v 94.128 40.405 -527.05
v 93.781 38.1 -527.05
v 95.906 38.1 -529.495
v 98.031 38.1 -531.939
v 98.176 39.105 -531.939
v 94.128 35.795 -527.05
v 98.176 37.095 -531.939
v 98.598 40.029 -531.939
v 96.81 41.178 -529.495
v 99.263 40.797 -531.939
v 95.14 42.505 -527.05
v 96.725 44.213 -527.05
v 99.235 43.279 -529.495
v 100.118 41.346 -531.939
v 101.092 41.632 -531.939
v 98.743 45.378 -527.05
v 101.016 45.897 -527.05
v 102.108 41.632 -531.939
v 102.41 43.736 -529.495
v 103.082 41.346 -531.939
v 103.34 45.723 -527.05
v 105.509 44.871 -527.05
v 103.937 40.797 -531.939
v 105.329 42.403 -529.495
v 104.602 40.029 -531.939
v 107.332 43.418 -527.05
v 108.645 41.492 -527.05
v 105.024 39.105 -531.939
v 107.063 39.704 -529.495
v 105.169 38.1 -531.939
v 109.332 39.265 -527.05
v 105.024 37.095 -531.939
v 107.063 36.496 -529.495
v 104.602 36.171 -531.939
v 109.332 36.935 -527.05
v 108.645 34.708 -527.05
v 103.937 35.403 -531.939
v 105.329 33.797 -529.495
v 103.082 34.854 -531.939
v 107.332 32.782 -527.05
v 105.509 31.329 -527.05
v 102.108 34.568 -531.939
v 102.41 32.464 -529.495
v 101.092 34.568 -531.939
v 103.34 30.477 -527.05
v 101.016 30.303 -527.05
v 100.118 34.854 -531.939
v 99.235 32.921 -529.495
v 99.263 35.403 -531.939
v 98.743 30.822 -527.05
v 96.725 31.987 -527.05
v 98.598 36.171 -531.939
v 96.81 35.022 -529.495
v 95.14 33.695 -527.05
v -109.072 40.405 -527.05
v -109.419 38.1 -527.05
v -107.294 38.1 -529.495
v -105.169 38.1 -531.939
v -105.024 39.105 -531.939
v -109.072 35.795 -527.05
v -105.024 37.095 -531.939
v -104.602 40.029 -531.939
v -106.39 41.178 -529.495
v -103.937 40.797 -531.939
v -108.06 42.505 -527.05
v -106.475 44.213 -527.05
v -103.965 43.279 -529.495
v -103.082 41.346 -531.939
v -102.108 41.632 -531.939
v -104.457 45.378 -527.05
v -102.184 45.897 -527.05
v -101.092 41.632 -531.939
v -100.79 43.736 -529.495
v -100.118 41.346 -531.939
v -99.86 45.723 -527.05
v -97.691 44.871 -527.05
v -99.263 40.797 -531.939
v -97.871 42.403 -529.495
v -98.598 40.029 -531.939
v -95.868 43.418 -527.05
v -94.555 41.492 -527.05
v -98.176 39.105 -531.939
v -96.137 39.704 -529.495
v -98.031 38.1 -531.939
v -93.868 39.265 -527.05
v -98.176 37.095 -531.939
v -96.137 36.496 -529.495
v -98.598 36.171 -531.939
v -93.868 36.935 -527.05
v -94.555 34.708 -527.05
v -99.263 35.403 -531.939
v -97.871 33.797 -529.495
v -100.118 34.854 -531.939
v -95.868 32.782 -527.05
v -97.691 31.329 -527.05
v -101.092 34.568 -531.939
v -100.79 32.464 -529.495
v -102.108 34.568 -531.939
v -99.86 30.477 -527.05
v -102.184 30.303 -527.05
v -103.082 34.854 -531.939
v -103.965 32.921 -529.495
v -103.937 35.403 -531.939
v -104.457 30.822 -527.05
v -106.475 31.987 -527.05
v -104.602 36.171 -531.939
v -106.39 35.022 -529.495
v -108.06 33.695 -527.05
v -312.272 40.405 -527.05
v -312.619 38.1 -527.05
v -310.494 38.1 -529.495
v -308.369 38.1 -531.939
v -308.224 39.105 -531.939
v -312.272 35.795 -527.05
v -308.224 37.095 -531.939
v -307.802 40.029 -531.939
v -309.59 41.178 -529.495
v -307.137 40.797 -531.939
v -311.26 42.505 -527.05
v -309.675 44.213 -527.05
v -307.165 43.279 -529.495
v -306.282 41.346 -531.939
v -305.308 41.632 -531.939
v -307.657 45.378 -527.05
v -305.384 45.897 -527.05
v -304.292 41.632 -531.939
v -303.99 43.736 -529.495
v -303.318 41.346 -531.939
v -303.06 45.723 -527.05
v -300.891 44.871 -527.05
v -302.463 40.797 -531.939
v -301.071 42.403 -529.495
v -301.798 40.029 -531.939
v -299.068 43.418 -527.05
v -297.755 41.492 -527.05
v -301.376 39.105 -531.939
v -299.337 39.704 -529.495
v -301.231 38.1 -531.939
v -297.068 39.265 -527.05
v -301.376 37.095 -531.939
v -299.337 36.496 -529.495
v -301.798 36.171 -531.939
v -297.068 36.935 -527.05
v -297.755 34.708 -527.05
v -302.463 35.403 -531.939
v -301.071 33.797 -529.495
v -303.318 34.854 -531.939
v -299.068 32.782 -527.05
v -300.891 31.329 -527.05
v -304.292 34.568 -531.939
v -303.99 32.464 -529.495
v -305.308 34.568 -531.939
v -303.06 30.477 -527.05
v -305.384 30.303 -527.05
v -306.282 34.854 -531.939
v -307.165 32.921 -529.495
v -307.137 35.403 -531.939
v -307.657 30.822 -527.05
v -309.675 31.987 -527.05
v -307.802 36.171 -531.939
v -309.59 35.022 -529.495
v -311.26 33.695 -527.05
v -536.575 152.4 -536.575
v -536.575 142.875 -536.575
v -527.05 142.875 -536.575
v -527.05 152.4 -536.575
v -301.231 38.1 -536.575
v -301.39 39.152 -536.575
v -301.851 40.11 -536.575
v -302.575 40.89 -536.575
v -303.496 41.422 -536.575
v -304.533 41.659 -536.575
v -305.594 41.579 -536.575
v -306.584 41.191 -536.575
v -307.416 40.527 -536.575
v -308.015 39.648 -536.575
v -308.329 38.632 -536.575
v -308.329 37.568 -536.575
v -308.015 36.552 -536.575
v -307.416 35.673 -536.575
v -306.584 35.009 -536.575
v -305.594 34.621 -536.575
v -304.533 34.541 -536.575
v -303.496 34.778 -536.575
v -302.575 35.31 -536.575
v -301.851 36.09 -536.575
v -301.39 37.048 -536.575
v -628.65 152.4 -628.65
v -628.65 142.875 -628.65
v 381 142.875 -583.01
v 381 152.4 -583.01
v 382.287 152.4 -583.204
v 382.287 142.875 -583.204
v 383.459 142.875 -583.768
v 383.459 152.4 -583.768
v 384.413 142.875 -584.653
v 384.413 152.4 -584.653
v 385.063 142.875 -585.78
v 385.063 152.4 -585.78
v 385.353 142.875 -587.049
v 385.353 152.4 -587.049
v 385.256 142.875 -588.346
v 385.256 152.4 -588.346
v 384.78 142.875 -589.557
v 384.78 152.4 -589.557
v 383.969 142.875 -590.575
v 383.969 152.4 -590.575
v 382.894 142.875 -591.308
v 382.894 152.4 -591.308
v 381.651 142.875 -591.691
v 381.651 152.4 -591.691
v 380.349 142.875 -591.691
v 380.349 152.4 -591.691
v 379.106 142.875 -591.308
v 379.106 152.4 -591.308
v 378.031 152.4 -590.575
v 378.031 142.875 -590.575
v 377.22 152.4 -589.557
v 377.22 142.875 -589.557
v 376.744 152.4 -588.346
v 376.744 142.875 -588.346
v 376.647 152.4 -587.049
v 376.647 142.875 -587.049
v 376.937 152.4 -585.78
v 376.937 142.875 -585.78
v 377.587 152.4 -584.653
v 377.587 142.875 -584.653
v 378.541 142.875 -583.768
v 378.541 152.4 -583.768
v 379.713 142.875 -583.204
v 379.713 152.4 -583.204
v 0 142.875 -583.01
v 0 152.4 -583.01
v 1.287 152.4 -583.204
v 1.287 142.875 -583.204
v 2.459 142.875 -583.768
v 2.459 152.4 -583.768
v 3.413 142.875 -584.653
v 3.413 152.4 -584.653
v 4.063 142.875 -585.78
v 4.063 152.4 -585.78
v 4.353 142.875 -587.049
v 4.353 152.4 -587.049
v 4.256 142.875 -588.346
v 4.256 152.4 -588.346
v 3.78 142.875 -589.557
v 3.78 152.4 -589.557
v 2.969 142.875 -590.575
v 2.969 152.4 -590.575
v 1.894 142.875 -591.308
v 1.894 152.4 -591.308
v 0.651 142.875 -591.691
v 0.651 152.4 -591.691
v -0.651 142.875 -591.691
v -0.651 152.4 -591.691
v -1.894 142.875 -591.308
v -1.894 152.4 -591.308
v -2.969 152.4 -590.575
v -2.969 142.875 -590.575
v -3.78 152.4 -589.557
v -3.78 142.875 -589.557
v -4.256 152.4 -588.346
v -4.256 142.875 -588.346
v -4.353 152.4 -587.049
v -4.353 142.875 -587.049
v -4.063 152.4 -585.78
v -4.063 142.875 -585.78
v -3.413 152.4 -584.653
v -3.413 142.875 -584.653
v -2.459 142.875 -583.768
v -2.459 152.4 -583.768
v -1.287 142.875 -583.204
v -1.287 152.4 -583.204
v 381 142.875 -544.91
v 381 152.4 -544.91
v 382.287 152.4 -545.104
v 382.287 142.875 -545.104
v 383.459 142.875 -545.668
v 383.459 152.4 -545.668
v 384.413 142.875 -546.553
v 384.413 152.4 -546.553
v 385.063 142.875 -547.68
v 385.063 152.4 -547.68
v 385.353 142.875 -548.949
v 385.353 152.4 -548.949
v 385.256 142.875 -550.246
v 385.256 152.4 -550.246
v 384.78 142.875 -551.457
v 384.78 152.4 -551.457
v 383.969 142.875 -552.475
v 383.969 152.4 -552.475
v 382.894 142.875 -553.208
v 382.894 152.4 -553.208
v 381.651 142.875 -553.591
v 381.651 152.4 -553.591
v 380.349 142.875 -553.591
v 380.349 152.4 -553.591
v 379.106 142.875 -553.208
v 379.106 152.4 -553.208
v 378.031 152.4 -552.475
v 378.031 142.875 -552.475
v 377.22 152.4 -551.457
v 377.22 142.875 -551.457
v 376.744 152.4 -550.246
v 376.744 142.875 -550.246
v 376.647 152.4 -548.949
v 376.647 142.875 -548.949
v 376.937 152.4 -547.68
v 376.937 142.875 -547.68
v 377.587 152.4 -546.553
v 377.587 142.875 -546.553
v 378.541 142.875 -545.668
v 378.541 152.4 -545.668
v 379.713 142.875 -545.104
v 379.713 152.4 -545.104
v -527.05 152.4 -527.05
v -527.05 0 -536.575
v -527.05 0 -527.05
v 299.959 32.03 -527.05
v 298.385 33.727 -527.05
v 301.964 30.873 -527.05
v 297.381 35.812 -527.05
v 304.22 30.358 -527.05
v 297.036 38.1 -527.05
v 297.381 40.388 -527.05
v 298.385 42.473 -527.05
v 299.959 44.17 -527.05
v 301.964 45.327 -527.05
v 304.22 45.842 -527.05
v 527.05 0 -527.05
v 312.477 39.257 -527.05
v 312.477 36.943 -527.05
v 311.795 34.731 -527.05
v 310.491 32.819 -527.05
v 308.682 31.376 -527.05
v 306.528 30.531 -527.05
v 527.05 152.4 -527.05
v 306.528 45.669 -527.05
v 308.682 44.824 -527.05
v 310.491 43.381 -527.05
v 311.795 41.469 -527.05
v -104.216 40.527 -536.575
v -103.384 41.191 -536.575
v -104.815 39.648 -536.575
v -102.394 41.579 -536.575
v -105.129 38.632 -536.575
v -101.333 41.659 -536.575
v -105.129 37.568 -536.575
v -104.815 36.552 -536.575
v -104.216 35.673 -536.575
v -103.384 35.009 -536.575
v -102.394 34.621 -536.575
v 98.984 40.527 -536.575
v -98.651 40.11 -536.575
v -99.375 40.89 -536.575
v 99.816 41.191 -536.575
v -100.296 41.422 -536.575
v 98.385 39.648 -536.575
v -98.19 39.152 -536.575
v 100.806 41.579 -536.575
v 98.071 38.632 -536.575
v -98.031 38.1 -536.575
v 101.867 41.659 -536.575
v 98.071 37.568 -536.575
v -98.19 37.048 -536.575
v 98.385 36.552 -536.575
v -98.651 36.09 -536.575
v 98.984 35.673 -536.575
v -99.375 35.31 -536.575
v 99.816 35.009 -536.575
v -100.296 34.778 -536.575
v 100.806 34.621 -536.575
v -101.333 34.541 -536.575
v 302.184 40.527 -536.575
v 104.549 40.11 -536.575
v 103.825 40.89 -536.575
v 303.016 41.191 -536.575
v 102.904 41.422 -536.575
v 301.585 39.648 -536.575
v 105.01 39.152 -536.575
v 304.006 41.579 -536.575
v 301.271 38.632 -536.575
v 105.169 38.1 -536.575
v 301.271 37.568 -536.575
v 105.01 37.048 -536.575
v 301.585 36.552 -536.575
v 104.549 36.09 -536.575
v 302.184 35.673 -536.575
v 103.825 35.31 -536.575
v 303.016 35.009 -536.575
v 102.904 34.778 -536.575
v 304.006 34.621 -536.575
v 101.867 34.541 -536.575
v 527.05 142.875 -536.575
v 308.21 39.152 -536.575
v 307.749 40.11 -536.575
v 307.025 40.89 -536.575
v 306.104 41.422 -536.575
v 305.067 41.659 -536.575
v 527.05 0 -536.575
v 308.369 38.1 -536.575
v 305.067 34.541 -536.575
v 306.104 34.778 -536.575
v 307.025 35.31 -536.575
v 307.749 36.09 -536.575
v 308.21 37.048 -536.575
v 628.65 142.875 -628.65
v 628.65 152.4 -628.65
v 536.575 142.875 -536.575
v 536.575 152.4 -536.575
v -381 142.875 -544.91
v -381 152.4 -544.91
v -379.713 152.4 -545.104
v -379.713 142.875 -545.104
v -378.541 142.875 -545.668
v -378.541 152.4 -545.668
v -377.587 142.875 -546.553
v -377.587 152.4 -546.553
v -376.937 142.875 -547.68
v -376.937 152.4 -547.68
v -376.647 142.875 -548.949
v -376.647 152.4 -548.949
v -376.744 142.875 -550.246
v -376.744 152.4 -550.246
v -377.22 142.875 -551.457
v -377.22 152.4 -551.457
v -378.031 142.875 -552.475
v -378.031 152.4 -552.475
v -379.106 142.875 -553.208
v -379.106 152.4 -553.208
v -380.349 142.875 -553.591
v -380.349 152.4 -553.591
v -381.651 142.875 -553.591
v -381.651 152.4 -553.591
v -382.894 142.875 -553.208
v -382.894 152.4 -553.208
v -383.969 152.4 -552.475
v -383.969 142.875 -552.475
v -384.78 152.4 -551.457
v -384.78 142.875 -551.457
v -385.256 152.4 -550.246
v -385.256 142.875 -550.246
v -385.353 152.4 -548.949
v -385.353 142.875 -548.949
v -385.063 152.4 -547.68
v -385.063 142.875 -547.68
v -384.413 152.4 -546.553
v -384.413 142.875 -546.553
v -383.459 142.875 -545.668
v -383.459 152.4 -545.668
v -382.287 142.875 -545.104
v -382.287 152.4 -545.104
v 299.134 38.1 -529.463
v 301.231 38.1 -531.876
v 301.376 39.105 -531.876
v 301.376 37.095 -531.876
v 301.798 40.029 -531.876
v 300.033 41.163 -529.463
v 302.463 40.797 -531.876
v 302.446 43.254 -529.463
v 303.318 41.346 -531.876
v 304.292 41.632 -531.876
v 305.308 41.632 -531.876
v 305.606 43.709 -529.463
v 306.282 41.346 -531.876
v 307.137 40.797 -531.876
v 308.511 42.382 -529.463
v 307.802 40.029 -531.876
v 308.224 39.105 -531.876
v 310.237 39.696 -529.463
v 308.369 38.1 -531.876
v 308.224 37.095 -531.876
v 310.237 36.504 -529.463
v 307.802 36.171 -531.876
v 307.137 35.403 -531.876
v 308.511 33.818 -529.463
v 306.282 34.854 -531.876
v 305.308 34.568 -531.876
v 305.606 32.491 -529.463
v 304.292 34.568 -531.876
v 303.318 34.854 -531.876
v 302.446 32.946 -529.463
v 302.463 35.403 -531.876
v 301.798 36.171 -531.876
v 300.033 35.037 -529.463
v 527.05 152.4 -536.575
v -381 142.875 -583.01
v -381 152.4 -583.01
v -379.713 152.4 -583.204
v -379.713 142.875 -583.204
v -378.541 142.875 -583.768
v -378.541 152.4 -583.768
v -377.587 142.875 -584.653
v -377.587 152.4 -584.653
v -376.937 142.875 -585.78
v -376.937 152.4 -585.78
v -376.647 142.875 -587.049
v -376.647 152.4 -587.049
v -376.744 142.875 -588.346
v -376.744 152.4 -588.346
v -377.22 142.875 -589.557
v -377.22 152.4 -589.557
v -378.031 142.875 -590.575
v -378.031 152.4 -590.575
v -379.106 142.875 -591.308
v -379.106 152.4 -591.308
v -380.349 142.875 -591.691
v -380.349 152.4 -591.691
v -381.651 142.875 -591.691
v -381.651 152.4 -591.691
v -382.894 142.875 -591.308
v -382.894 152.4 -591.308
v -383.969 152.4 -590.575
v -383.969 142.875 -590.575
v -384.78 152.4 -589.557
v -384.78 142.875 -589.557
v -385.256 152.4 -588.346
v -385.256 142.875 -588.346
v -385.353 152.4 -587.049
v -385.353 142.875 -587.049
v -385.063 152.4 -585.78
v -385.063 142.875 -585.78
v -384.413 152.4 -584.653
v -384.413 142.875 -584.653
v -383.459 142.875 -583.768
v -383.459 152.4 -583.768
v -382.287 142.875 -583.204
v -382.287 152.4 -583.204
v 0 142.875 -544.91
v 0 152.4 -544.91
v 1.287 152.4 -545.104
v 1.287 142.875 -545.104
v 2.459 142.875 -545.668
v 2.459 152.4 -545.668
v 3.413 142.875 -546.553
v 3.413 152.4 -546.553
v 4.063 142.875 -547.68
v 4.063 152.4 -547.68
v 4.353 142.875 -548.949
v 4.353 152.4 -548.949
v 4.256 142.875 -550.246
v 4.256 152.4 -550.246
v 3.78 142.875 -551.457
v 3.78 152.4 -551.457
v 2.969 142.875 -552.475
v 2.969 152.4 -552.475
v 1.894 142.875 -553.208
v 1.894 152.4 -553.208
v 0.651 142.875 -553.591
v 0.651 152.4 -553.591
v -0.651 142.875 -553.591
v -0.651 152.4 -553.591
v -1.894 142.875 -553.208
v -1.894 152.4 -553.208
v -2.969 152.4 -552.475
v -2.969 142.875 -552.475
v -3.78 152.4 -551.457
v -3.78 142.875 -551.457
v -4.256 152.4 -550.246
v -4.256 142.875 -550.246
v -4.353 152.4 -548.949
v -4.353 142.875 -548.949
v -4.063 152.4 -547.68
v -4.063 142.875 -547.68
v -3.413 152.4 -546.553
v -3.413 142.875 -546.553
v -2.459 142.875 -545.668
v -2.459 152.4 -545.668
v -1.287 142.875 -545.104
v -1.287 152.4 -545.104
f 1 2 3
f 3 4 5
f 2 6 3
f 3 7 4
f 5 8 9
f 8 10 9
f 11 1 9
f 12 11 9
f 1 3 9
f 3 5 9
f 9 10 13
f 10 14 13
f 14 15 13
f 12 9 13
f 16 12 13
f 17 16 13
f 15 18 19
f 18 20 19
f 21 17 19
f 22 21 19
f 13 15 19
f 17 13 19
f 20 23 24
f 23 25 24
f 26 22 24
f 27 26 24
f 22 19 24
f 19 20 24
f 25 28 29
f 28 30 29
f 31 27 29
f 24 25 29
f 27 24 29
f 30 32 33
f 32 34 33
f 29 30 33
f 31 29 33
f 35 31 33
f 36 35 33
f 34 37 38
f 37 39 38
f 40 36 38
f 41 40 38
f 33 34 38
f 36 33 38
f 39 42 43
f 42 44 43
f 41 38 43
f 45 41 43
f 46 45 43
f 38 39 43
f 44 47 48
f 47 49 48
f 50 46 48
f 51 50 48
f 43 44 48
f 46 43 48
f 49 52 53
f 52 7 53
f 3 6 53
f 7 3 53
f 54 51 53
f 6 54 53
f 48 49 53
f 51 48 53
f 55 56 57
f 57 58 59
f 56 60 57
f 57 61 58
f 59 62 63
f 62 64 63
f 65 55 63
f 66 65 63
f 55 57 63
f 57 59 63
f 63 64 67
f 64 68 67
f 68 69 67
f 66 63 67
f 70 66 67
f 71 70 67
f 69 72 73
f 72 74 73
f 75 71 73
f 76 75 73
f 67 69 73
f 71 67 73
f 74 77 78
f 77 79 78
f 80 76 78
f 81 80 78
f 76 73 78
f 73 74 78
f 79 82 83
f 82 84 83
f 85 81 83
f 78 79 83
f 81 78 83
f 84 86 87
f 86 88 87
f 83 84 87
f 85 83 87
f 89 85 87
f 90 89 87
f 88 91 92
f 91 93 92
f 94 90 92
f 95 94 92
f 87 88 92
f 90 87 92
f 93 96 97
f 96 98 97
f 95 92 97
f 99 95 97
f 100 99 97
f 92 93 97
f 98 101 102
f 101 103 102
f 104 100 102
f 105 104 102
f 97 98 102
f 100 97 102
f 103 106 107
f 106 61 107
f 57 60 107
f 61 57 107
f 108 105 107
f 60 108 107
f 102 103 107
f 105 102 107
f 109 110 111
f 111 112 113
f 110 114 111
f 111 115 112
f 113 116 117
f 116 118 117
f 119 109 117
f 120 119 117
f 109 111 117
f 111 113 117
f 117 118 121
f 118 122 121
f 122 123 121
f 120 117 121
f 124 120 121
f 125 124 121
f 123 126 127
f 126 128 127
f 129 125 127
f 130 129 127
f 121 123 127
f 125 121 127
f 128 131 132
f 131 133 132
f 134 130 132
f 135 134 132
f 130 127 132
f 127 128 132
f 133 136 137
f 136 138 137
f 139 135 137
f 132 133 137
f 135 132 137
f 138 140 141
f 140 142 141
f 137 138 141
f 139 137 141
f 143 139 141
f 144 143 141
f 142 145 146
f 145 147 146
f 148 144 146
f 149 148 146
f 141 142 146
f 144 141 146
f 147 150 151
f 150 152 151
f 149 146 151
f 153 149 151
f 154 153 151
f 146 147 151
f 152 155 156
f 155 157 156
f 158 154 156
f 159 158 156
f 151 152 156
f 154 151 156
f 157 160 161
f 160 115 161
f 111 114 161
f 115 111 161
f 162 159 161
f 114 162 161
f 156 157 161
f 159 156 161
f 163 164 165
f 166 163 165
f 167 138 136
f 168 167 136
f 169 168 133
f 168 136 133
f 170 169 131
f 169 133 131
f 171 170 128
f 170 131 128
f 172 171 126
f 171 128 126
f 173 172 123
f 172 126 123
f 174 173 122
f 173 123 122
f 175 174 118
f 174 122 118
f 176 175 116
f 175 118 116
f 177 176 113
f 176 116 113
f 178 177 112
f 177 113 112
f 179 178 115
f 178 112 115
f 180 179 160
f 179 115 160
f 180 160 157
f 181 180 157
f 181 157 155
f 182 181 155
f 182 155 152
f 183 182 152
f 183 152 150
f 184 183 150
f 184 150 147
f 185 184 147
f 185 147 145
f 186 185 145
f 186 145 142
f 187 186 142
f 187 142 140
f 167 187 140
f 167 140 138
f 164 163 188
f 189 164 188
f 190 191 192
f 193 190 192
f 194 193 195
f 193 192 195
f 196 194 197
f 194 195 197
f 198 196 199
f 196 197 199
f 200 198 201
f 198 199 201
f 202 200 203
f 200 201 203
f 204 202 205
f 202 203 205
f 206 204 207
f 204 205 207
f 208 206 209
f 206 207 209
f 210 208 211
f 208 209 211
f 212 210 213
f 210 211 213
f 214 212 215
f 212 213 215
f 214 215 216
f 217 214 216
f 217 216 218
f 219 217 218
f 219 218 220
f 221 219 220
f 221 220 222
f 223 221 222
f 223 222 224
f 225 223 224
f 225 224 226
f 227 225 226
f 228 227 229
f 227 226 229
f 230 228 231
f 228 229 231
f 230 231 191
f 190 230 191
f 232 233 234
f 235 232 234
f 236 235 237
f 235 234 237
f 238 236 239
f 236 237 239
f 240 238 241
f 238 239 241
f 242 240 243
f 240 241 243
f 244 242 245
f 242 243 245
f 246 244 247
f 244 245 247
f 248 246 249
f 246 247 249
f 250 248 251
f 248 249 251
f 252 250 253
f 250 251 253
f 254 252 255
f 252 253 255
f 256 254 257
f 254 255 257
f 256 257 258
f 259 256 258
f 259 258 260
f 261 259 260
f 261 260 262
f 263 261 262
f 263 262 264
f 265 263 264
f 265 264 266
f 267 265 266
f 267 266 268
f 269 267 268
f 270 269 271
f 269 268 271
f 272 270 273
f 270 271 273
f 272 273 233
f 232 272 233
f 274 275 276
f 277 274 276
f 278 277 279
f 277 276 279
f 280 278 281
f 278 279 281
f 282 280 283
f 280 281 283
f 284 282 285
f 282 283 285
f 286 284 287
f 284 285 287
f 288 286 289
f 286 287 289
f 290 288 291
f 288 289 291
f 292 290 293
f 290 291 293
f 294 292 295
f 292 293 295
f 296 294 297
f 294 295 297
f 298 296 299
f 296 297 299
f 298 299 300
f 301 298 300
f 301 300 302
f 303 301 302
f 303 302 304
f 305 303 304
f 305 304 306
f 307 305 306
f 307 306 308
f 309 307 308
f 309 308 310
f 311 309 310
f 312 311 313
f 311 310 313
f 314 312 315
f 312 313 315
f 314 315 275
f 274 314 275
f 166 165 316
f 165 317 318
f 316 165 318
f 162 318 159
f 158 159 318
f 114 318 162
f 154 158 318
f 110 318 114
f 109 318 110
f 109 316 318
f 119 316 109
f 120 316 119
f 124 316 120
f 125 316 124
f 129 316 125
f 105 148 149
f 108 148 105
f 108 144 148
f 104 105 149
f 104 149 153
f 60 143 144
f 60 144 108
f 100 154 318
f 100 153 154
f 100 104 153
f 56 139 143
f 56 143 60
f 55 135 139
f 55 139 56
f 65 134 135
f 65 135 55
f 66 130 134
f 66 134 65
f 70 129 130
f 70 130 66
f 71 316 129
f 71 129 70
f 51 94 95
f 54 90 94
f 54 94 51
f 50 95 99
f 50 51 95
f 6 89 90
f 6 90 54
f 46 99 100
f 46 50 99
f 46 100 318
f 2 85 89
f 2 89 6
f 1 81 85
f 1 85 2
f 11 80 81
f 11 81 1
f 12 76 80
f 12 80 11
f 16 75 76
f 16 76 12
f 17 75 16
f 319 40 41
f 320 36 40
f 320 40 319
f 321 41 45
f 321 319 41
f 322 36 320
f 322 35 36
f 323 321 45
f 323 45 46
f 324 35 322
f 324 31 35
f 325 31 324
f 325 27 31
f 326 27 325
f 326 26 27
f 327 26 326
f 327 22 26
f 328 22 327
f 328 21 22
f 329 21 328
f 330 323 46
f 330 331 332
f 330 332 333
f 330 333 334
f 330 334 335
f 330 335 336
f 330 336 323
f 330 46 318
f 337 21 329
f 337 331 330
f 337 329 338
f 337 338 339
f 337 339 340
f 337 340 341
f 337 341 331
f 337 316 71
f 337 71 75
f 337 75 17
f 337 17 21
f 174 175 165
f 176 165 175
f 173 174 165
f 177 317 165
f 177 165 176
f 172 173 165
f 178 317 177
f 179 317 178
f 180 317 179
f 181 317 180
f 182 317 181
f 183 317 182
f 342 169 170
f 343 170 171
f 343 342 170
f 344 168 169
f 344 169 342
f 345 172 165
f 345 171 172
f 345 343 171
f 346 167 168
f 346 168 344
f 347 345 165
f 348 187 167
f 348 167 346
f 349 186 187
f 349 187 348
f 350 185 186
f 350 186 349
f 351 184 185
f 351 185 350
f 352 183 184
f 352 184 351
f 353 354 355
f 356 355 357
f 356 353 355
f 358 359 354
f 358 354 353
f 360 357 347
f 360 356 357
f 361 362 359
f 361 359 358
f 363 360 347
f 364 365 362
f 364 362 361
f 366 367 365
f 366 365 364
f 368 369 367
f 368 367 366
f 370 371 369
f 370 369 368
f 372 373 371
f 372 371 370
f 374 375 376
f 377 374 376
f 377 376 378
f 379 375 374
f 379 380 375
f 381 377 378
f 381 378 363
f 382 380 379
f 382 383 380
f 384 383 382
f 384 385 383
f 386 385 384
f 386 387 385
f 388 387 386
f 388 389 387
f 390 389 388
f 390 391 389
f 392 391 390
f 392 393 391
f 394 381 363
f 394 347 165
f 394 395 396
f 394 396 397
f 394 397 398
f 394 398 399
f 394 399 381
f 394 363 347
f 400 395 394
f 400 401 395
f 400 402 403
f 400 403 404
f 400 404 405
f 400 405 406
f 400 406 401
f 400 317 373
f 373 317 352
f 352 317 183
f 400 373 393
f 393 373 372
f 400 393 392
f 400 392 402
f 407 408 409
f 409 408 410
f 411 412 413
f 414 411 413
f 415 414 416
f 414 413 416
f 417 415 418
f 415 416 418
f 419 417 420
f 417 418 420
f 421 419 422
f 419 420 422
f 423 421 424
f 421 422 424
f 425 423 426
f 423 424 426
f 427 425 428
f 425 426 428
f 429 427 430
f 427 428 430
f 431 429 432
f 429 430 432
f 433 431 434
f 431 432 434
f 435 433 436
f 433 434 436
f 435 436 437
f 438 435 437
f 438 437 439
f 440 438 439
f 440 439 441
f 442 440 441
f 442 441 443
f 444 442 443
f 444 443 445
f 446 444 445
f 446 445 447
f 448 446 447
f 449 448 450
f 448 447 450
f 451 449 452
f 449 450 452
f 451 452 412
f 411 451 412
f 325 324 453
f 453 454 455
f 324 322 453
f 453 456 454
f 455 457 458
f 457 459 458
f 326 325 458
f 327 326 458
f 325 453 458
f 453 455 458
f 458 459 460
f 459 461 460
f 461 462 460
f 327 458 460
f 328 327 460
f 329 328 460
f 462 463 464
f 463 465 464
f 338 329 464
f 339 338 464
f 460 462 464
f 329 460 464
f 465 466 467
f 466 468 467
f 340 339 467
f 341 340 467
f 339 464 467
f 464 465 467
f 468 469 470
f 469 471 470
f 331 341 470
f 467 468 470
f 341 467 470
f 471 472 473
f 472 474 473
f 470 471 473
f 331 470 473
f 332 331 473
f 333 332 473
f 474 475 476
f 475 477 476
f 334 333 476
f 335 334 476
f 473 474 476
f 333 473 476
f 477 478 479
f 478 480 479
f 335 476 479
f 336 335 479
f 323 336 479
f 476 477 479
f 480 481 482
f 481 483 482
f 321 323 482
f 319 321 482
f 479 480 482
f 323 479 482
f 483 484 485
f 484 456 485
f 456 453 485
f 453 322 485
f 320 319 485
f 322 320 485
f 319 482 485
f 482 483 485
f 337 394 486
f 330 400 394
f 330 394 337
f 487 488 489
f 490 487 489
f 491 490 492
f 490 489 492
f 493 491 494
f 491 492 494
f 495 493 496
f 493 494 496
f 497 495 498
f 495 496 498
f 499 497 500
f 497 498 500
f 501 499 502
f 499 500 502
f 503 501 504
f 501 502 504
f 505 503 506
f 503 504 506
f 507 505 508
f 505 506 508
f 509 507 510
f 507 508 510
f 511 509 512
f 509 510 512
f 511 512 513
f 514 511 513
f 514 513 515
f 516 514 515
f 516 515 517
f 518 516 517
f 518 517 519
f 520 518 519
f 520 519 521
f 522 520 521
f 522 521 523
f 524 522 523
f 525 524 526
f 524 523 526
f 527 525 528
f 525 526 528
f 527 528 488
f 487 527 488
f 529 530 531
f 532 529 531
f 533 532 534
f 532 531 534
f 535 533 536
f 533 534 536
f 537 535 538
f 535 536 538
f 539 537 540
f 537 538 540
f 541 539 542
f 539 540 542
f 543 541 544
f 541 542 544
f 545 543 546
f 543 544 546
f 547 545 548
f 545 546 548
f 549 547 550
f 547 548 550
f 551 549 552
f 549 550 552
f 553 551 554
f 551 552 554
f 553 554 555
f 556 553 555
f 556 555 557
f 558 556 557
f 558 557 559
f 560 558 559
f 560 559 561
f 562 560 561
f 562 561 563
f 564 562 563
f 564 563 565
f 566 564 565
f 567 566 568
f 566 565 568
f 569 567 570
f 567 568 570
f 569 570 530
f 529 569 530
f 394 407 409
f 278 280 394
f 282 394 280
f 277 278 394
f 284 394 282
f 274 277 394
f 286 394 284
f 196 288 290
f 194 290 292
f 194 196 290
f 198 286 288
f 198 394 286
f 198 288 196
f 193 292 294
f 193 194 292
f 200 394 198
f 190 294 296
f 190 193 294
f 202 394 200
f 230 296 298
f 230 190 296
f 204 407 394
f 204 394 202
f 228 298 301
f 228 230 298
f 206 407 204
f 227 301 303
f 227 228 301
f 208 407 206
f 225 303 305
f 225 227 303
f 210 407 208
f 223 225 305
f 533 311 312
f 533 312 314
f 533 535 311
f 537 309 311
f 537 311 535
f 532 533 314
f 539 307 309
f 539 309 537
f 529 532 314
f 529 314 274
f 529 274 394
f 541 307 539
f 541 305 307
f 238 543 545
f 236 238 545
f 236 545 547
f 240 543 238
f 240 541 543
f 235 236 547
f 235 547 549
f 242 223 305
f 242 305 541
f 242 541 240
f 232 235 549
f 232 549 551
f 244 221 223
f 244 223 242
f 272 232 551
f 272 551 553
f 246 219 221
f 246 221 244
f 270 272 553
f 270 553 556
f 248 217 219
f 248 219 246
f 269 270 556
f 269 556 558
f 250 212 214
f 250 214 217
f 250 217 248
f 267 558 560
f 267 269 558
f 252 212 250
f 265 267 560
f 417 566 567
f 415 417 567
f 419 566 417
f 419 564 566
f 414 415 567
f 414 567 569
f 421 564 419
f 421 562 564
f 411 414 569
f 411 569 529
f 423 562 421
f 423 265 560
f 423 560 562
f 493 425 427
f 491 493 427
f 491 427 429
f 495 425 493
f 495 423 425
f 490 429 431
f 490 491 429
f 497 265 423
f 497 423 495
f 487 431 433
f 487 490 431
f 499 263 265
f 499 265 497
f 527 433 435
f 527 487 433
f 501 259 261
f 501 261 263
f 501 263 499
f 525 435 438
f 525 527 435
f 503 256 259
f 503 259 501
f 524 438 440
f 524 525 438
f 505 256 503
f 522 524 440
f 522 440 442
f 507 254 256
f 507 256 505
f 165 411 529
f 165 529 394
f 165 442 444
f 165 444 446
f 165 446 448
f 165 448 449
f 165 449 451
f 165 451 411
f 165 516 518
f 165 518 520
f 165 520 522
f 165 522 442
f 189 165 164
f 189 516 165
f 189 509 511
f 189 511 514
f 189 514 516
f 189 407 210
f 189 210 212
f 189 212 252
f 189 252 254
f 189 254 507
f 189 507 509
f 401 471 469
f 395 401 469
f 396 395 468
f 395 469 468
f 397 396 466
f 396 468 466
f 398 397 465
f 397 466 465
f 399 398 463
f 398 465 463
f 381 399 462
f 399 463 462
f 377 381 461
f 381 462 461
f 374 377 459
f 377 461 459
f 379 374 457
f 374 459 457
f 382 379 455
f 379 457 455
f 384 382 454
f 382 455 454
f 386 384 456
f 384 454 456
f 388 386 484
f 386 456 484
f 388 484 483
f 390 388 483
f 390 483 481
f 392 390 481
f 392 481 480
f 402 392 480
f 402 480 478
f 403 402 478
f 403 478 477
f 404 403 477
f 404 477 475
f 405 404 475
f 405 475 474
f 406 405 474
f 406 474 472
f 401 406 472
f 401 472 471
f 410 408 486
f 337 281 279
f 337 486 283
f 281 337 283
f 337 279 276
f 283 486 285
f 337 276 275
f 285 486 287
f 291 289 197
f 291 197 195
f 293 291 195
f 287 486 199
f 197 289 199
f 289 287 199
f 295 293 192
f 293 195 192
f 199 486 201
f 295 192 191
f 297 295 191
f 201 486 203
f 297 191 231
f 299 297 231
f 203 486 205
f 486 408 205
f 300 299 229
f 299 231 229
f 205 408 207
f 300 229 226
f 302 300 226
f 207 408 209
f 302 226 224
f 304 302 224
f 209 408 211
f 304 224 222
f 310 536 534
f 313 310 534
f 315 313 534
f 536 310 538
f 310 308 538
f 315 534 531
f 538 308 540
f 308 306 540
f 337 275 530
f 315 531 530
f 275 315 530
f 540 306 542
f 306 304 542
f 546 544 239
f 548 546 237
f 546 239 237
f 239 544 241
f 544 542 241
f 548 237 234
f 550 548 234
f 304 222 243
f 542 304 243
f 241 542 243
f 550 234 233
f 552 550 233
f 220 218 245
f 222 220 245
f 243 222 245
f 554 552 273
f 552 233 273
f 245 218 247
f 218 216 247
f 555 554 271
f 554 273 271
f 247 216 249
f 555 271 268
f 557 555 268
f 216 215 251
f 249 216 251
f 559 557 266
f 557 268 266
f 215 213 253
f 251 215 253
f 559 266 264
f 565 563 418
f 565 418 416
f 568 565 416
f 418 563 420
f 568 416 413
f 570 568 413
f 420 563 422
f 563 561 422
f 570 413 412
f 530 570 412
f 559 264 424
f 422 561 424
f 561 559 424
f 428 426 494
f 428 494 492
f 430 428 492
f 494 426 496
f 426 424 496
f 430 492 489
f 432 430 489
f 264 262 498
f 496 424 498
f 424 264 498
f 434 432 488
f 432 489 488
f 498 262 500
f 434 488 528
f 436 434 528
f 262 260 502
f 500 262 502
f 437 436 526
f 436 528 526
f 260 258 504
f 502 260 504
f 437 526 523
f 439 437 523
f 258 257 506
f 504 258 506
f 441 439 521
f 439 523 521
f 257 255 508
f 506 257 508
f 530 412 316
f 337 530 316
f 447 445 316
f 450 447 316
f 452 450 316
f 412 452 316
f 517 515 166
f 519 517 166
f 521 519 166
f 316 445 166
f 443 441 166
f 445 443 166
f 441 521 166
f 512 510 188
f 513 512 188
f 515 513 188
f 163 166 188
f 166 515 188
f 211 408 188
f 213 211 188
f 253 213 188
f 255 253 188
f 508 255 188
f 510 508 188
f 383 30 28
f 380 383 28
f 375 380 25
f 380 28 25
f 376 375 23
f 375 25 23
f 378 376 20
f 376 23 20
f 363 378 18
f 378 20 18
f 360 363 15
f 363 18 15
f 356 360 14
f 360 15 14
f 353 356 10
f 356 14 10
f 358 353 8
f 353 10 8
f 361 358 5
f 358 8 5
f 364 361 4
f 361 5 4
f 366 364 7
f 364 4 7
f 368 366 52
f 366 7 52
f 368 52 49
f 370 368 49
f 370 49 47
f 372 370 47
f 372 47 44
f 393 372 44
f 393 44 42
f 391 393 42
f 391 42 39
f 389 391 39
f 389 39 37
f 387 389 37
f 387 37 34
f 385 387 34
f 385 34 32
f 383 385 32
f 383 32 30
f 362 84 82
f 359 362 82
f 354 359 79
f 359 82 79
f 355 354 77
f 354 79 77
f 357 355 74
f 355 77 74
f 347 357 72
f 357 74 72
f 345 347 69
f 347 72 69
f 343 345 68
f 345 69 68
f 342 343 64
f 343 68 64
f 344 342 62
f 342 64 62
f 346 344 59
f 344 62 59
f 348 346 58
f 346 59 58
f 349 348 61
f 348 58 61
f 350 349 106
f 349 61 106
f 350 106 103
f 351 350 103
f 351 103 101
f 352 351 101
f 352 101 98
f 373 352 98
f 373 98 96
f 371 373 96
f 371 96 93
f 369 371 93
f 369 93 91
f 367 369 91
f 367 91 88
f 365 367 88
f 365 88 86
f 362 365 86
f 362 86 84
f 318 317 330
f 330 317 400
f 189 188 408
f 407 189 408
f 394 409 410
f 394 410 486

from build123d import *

# Parameters (mm, degrees)
SKETCH3_W                                        = 1073.15
SKETCH3_H                                        = 1073.15
BOSS_EXTRUDE1_DEPTH                              = 152.4
SKETCH4_OUTSIDE_W                                = 1380.21
SKETCH4_OUTSIDE_H                                = 1380.21
SKETCH4_OUTSIDE_W_2                              = 1073.15
SKETCH4_OUTSIDE_H_2                              = 1073.15
SKETCH4_OUTSIDE_W_3                              = 1054.1
SKETCH4_OUTSIDE_H_3                              = 1054.1
CUT_EXTRUDE3_DEPTH                               = 142.875
SKETCH5_W                                        = 1358.9
SKETCH5_H                                        = 1358.9
SKETCH5_W_2                                      = 1073.15
SKETCH5_H_2                                      = 1073.15
BOSS_EXTRUDE2_DEPTH                              = 9.525
SKETCH6_W                                        = 1054.1
SKETCH6_H                                        = 1054.1
CUT_EXTRUDE5_DEPTH                               = 9.525
SKETCH7_R                                        = 4.365625
SKETCH7_R_2                                      = 4.36499
CUT_EXTRUDE6_DEPTH                               = 9.525
SKETCH8_R                                        = 2.50063
CUT_EXTRUDE7_DEPTH                               = 1270
SKETCH9_R                                        = 2.50063
CUT_EXTRUDE8_DEPTH                               = 1270
SKETCH10_R                                       = 3.5687
CUT_EXTRUDE10_DEPTH                              = 1270
SKETCH11_W                                       = 1358.9
SKETCH11_H                                       = 1358.9
SKETCH11_W_2                                     = 1206.5
SKETCH11_H_2                                     = 1206.5
CUT_EXTRUDE11_DEPTH                              = 9.525
CUT_EXTRUDE12_DEPTH                              = 254
CUT_EXTRUDE13_DEPTH                              = 867.629612349
CSK_FOR_1_4_FLAT_HEAD_MACHINE_SCREW1_D           = 7.1374
CSK_FOR_1_4_FLAT_HEAD_MACHINE_SCREW1_CSINK_D     = 15.637764
CSK_FOR_1_4_FLAT_HEAD_MACHINE_SCREW1_CSINK_ANGLE = 82
CSK_FOR_1_4_FLAT_HEAD_MACHINE_SCREW2_D           = 7.1374
CSK_FOR_1_4_FLAT_HEAD_MACHINE_SCREW2_CSINK_D     = 15.637764
CSK_FOR_1_4_FLAT_HEAD_MACHINE_SCREW2_CSINK_ANGLE = 82
CSK_FOR_1_4_FLAT_HEAD_MACHINE_SCREW3_D           = 7.1374
CSK_FOR_1_4_FLAT_HEAD_MACHINE_SCREW3_CSINK_D     = 15.637764
CSK_FOR_1_4_FLAT_HEAD_MACHINE_SCREW3_CSINK_ANGLE = 82
CSK_FOR_1_4_FLAT_HEAD_MACHINE_SCREW5_D           = 7.1374
CSK_FOR_1_4_FLAT_HEAD_MACHINE_SCREW5_CSINK_D     = 15.5273756
CSK_FOR_1_4_FLAT_HEAD_MACHINE_SCREW5_CSINK_ANGLE = 82
BOSS_EXTRUDE3_DEPTH                              = 9.525


with BuildPart() as part:
    # Sketch3 → Boss-Extrude1 (new body)
    with BuildSketch(Plane(origin=(0, 0, 0), x_dir=(1, 0, 0), z_dir=(0, 1, 0))):
        Rectangle(SKETCH3_W, SKETCH3_H)
    extrude(amount=BOSS_EXTRUDE1_DEPTH)

    # Sketch4 outside → Cut-Extrude3 (cut)
    # profile 1 of 2: a face of its own
    with BuildSketch(Plane(origin=(0, 152.4, 0), x_dir=(1, 0, 0), z_dir=(0, 1, 0))):
        Rectangle(SKETCH4_OUTSIDE_W, SKETCH4_OUTSIDE_H)
        Rectangle(SKETCH4_OUTSIDE_W_2, SKETCH4_OUTSIDE_H_2, mode=Mode.SUBTRACT)
    # profile 2 of 2: a face of its own
    with BuildSketch(Plane(origin=(0, 152.4, 0), x_dir=(1, 0, 0), z_dir=(0, 1, 0))):
        Rectangle(SKETCH4_OUTSIDE_W_3, SKETCH4_OUTSIDE_H_3)
    extrude(amount=-CUT_EXTRUDE3_DEPTH, mode=Mode.SUBTRACT)

    # Sketch5 → Boss-Extrude2 (add)
    with BuildSketch(Plane(origin=(0, 152.4, 0), x_dir=(1, 0, 0), z_dir=(0, 1, 0))):
        Rectangle(SKETCH5_W, SKETCH5_H)
        Rectangle(SKETCH5_W_2, SKETCH5_H_2, mode=Mode.SUBTRACT)
    extrude(amount=-BOSS_EXTRUDE2_DEPTH)

    # Sketch6 → Cut-Extrude5 (cut)
    with BuildSketch(Plane(origin=(0, 9.525, 0), x_dir=(1, 0, 0), z_dir=(0, 1, 0))):
        Rectangle(SKETCH6_W, SKETCH6_H)
    extrude(amount=-CUT_EXTRUDE5_DEPTH, mode=Mode.SUBTRACT)

    # Sketch7 → Cut-Extrude6 (cut)
    with BuildSketch(Plane(origin=(0, 152.4, 0), x_dir=(1, 0, 0), z_dir=(0, 1, 0))):
        with Locations(Location((549.275, 38.1, 0), (0, 0, 270))):
            Circle(SKETCH7_R)
        with Locations(Location((587.375, -38.1, 0), (0, 0, 270))):
            Circle(SKETCH7_R)
        with Locations(Location((549.275, -38.1, 0), (0, 0, 270))):
            Circle(SKETCH7_R)
        with Locations(Location((587.375, 38.1, 0), (0, 0, 270))):
            Circle(SKETCH7_R)
        with Locations(Location((549.275, 419.1, 0), (0, 0, 270))):
            Circle(SKETCH7_R)
        with Locations(Location((549.275, 342.9, 0), (0, 0, 270))):
            Circle(SKETCH7_R)
        with Locations(Location((587.375, 342.9, 0), (0, 0, 270))):
            Circle(SKETCH7_R)
        with Locations(Location((587.375, 419.1, 0), (0, 0, 270))):
            Circle(SKETCH7_R)
        with Locations(Location((587.375, -419.1, 0), (0, 0, 270))):
            Circle(SKETCH7_R)
        with Locations(Location((549.275, -419.1, 0), (0, 0, 270))):
            Circle(SKETCH7_R)
        with Locations(Location((587.375, -342.9, 0), (0, 0, 270))):
            Circle(SKETCH7_R)
        with Locations(Location((549.275, -342.9, 0), (0, 0, 270))):
            Circle(SKETCH7_R)
        with Locations(Location((-549.275, -38.1, 0), (0, 0, 270))):
            Circle(SKETCH7_R)
        with Locations(Location((-549.275, 419.1, 0), (0, 0, 270))):
            Circle(SKETCH7_R)
        with Locations(Location((-549.275, 342.9, 0), (0, 0, 270))):
            Circle(SKETCH7_R)
        with Locations(Location((-549.275, -342.9, 0), (0, 0, 270))):
            Circle(SKETCH7_R)
        with Locations(Location((-549.275, 38.1, 0), (0, 0, 270))):
            Circle(SKETCH7_R)
        with Locations(Location((-549.275, -419.1, 0), (0, 0, 270))):
            Circle(SKETCH7_R)
        with Locations(Location((-342.9, -549.275, 0), (0, 0, 270))):
            Circle(SKETCH7_R)
        with Locations(Location((-38.1, -549.275, 0), (0, 0, 270))):
            Circle(SKETCH7_R)
        with Locations(Location((419.1, -549.275, 0), (0, 0, 270))):
            Circle(SKETCH7_R)
        with Locations(Location((342.9, -549.275, 0), (0, 0, 270))):
            Circle(SKETCH7_R)
        with Locations(Location((38.1, -549.275, 0), (0, 0, 270))):
            Circle(SKETCH7_R)
        with Locations(Location((-419.1, -549.275, 0), (0, 0, 270))):
            Circle(SKETCH7_R)
        with Locations(Location((-584.2, -342.9, 0), (0, 0, 270))):
            Circle(SKETCH7_R)
        with Locations(Location((-584.2, -419.1, 0), (0, 0, 270))):
            Circle(SKETCH7_R)
        with Locations(Location((-584.2, 342.9, 0), (0, 0, 270))):
            Circle(SKETCH7_R)
        with Locations(Location((-584.2, -38.1, 0), (0, 0, 270))):
            Circle(SKETCH7_R)
        with Locations(Location((-584.2, 419.1, 0), (0, 0, 270))):
            Circle(SKETCH7_R)
        with Locations(Location((-584.2, 38.1, 0), (0, 0, 270))):
            Circle(SKETCH7_R)
        with Locations(Location((-342.9, -584.2, 0), (0, 0, 270))):
            Circle(SKETCH7_R)
        with Locations(Location((-419.1, -584.2, 0), (0, 0, 270))):
            Circle(SKETCH7_R)
        with Locations(Location((38.1, -584.2, 0), (0, 0, 270))):
            Circle(SKETCH7_R)
        with Locations(Location((419.1, -584.2, 0), (0, 0, 270))):
            Circle(SKETCH7_R)
        with Locations(Location((-38.1, -584.2, 0), (0, 0, 270))):
            Circle(SKETCH7_R)
        with Locations(Location((342.9, -584.2, 0), (0, 0, 270))):
            Circle(SKETCH7_R)
        with Locations(Location((-381, 587.375, 0), (0, 0, 270))):
            Circle(SKETCH7_R_2)
        with Locations(Location((-381, 549.275, 0), (0, 0, 270))):
            Circle(SKETCH7_R_2)
        with Locations(Location((0, 587.375, 0), (0, 0, 270))):
            Circle(SKETCH7_R_2)
        with Locations(Location((0, 549.275, 0), (0, 0, 270))):
            Circle(SKETCH7_R_2)
        with Locations(Location((381, 587.375, 0), (0, 0, 270))):
            Circle(SKETCH7_R_2)
        with Locations(Location((381, 549.275, 0), (0, 0, 270))):
            Circle(SKETCH7_R_2)
    extrude(amount=-CUT_EXTRUDE6_DEPTH, mode=Mode.SUBTRACT)

    # Sketch8 → Cut-Extrude7 (cut)
    with BuildSketch(Plane.ZY.offset(536.575)):
        with Locations((371.475, 38.1)):
            Circle(SKETCH8_R)
    extrude(amount=-CUT_EXTRUDE7_DEPTH, mode=Mode.SUBTRACT)

    # Sketch9 → Cut-Extrude8 (cut)
    with BuildSketch(Plane.ZY.offset(536.575)):
        with Locations((-371.475, 38.1)):
            Circle(SKETCH9_R)
        with Locations((-222.885, 38.1)):
            Circle(SKETCH9_R)
        with Locations((-74.295, 38.1)):
            Circle(SKETCH9_R)
        with Locations((74.295, 38.1)):
            Circle(SKETCH9_R)
        with Locations((222.885, 38.1)):
            Circle(SKETCH9_R)
    extrude(amount=-CUT_EXTRUDE8_DEPTH, mode=Mode.SUBTRACT)

    # Sketch10 → Cut-Extrude10 (cut)
    with BuildSketch(Plane.XY.offset(536.575)):
        with Locations((-304.8, 38.1)):
            Circle(SKETCH10_R)
        with Locations((-101.6, 38.1)):
            Circle(SKETCH10_R)
        with Locations((101.6, 38.1)):
            Circle(SKETCH10_R)
        with Locations((304.8, 38.1)):
            Circle(SKETCH10_R)
    extrude(amount=-CUT_EXTRUDE10_DEPTH, mode=Mode.SUBTRACT)

    # Sketch11 → Cut-Extrude11 (cut)
    with BuildSketch(Plane(origin=(0, 152.4, 0), x_dir=(1, 0, 0), z_dir=(0, 1, 0))):
        Rectangle(SKETCH11_W, SKETCH11_H)
        Rectangle(SKETCH11_W_2, SKETCH11_H_2, mode=Mode.SUBTRACT)
    extrude(amount=-CUT_EXTRUDE11_DEPTH, mode=Mode.SUBTRACT)

    # Sketch12 → Cut-Extrude12 (cut)
    with BuildSketch(Plane(origin=(0, 152.4, 0), x_dir=(1, 0, 0), z_dir=(0, 1, 0))):
        Polygon((-527.05, 527.05), (-527.05, -527.05), (527.05, -527.05), (527.05, 527.05), (603.25, 603.25), (603.25, -603.25), (-603.25, -603.25), (-603.25, 603.25), align=None)
    extrude(amount=-CUT_EXTRUDE12_DEPTH, mode=Mode.SUBTRACT)

    # Sketch14 → Cut-Extrude13 (cut, through all)
    with BuildSketch(Plane.XZ):
        Polygon((-527.05, -527.05), (-536.575, -536.575), (-527.05, -536.575), align=None)
        Polygon((536.575, -536.575), (527.05, -536.575), (527.05, -527.05), align=None)
    extrude(amount=-CUT_EXTRUDE13_DEPTH, mode=Mode.SUBTRACT)

    # CSK for 1/4 Flat Head Machine Screw1 (through all)
    with Locations(Plane(origin=(-304.8, 38.1, -527.05), x_dir=(1, 0, 0), z_dir=(0, 0, 1))):
        with Locations((0, 0)):
            CounterSinkHole(CSK_FOR_1_4_FLAT_HEAD_MACHINE_SCREW1_D / 2, CSK_FOR_1_4_FLAT_HEAD_MACHINE_SCREW1_CSINK_D / 2, counter_sink_angle=CSK_FOR_1_4_FLAT_HEAD_MACHINE_SCREW1_CSINK_ANGLE)

    # CSK for 1/4 Flat Head Machine Screw2 (through all)
    with Locations(Plane(origin=(-101.6, 38.1, -527.05), x_dir=(1, 0, 0), z_dir=(0, 0, 1))):
        with Locations((0, 0)):
            CounterSinkHole(CSK_FOR_1_4_FLAT_HEAD_MACHINE_SCREW2_D / 2, CSK_FOR_1_4_FLAT_HEAD_MACHINE_SCREW2_CSINK_D / 2, counter_sink_angle=CSK_FOR_1_4_FLAT_HEAD_MACHINE_SCREW2_CSINK_ANGLE)

    # CSK for 1/4 Flat Head Machine Screw3 (through all)
    with Locations(Plane(origin=(101.6, 38.1, -527.05), x_dir=(1, 0, 0), z_dir=(0, 0, 1))):
        with Locations((0, 0)):
            CounterSinkHole(CSK_FOR_1_4_FLAT_HEAD_MACHINE_SCREW3_D / 2, CSK_FOR_1_4_FLAT_HEAD_MACHINE_SCREW3_CSINK_D / 2, counter_sink_angle=CSK_FOR_1_4_FLAT_HEAD_MACHINE_SCREW3_CSINK_ANGLE)

    # CSK for 1/4 Flat Head Machine Screw5 (through all)
    with Locations(Plane(origin=(304.8, 38.1, -527.05), x_dir=(1, 0, 0), z_dir=(0, 0, 1))):
        with Locations((0, 0)):
            CounterSinkHole(CSK_FOR_1_4_FLAT_HEAD_MACHINE_SCREW5_D / 2, CSK_FOR_1_4_FLAT_HEAD_MACHINE_SCREW5_CSINK_D / 2, counter_sink_angle=CSK_FOR_1_4_FLAT_HEAD_MACHINE_SCREW5_CSINK_ANGLE)

    # Sketch22 → Boss-Extrude3 (add)
    with BuildSketch(Plane(origin=(0, 152.4, 0), x_dir=(1, 0, 0), z_dir=(0, 1, 0))):
        Polygon((603.25, 603.25), (-603.25, 603.25), (-628.65, 628.65), (628.65, 628.65), align=None)
    extrude(amount=-BOSS_EXTRUDE3_DEPTH)


solid = part.part
